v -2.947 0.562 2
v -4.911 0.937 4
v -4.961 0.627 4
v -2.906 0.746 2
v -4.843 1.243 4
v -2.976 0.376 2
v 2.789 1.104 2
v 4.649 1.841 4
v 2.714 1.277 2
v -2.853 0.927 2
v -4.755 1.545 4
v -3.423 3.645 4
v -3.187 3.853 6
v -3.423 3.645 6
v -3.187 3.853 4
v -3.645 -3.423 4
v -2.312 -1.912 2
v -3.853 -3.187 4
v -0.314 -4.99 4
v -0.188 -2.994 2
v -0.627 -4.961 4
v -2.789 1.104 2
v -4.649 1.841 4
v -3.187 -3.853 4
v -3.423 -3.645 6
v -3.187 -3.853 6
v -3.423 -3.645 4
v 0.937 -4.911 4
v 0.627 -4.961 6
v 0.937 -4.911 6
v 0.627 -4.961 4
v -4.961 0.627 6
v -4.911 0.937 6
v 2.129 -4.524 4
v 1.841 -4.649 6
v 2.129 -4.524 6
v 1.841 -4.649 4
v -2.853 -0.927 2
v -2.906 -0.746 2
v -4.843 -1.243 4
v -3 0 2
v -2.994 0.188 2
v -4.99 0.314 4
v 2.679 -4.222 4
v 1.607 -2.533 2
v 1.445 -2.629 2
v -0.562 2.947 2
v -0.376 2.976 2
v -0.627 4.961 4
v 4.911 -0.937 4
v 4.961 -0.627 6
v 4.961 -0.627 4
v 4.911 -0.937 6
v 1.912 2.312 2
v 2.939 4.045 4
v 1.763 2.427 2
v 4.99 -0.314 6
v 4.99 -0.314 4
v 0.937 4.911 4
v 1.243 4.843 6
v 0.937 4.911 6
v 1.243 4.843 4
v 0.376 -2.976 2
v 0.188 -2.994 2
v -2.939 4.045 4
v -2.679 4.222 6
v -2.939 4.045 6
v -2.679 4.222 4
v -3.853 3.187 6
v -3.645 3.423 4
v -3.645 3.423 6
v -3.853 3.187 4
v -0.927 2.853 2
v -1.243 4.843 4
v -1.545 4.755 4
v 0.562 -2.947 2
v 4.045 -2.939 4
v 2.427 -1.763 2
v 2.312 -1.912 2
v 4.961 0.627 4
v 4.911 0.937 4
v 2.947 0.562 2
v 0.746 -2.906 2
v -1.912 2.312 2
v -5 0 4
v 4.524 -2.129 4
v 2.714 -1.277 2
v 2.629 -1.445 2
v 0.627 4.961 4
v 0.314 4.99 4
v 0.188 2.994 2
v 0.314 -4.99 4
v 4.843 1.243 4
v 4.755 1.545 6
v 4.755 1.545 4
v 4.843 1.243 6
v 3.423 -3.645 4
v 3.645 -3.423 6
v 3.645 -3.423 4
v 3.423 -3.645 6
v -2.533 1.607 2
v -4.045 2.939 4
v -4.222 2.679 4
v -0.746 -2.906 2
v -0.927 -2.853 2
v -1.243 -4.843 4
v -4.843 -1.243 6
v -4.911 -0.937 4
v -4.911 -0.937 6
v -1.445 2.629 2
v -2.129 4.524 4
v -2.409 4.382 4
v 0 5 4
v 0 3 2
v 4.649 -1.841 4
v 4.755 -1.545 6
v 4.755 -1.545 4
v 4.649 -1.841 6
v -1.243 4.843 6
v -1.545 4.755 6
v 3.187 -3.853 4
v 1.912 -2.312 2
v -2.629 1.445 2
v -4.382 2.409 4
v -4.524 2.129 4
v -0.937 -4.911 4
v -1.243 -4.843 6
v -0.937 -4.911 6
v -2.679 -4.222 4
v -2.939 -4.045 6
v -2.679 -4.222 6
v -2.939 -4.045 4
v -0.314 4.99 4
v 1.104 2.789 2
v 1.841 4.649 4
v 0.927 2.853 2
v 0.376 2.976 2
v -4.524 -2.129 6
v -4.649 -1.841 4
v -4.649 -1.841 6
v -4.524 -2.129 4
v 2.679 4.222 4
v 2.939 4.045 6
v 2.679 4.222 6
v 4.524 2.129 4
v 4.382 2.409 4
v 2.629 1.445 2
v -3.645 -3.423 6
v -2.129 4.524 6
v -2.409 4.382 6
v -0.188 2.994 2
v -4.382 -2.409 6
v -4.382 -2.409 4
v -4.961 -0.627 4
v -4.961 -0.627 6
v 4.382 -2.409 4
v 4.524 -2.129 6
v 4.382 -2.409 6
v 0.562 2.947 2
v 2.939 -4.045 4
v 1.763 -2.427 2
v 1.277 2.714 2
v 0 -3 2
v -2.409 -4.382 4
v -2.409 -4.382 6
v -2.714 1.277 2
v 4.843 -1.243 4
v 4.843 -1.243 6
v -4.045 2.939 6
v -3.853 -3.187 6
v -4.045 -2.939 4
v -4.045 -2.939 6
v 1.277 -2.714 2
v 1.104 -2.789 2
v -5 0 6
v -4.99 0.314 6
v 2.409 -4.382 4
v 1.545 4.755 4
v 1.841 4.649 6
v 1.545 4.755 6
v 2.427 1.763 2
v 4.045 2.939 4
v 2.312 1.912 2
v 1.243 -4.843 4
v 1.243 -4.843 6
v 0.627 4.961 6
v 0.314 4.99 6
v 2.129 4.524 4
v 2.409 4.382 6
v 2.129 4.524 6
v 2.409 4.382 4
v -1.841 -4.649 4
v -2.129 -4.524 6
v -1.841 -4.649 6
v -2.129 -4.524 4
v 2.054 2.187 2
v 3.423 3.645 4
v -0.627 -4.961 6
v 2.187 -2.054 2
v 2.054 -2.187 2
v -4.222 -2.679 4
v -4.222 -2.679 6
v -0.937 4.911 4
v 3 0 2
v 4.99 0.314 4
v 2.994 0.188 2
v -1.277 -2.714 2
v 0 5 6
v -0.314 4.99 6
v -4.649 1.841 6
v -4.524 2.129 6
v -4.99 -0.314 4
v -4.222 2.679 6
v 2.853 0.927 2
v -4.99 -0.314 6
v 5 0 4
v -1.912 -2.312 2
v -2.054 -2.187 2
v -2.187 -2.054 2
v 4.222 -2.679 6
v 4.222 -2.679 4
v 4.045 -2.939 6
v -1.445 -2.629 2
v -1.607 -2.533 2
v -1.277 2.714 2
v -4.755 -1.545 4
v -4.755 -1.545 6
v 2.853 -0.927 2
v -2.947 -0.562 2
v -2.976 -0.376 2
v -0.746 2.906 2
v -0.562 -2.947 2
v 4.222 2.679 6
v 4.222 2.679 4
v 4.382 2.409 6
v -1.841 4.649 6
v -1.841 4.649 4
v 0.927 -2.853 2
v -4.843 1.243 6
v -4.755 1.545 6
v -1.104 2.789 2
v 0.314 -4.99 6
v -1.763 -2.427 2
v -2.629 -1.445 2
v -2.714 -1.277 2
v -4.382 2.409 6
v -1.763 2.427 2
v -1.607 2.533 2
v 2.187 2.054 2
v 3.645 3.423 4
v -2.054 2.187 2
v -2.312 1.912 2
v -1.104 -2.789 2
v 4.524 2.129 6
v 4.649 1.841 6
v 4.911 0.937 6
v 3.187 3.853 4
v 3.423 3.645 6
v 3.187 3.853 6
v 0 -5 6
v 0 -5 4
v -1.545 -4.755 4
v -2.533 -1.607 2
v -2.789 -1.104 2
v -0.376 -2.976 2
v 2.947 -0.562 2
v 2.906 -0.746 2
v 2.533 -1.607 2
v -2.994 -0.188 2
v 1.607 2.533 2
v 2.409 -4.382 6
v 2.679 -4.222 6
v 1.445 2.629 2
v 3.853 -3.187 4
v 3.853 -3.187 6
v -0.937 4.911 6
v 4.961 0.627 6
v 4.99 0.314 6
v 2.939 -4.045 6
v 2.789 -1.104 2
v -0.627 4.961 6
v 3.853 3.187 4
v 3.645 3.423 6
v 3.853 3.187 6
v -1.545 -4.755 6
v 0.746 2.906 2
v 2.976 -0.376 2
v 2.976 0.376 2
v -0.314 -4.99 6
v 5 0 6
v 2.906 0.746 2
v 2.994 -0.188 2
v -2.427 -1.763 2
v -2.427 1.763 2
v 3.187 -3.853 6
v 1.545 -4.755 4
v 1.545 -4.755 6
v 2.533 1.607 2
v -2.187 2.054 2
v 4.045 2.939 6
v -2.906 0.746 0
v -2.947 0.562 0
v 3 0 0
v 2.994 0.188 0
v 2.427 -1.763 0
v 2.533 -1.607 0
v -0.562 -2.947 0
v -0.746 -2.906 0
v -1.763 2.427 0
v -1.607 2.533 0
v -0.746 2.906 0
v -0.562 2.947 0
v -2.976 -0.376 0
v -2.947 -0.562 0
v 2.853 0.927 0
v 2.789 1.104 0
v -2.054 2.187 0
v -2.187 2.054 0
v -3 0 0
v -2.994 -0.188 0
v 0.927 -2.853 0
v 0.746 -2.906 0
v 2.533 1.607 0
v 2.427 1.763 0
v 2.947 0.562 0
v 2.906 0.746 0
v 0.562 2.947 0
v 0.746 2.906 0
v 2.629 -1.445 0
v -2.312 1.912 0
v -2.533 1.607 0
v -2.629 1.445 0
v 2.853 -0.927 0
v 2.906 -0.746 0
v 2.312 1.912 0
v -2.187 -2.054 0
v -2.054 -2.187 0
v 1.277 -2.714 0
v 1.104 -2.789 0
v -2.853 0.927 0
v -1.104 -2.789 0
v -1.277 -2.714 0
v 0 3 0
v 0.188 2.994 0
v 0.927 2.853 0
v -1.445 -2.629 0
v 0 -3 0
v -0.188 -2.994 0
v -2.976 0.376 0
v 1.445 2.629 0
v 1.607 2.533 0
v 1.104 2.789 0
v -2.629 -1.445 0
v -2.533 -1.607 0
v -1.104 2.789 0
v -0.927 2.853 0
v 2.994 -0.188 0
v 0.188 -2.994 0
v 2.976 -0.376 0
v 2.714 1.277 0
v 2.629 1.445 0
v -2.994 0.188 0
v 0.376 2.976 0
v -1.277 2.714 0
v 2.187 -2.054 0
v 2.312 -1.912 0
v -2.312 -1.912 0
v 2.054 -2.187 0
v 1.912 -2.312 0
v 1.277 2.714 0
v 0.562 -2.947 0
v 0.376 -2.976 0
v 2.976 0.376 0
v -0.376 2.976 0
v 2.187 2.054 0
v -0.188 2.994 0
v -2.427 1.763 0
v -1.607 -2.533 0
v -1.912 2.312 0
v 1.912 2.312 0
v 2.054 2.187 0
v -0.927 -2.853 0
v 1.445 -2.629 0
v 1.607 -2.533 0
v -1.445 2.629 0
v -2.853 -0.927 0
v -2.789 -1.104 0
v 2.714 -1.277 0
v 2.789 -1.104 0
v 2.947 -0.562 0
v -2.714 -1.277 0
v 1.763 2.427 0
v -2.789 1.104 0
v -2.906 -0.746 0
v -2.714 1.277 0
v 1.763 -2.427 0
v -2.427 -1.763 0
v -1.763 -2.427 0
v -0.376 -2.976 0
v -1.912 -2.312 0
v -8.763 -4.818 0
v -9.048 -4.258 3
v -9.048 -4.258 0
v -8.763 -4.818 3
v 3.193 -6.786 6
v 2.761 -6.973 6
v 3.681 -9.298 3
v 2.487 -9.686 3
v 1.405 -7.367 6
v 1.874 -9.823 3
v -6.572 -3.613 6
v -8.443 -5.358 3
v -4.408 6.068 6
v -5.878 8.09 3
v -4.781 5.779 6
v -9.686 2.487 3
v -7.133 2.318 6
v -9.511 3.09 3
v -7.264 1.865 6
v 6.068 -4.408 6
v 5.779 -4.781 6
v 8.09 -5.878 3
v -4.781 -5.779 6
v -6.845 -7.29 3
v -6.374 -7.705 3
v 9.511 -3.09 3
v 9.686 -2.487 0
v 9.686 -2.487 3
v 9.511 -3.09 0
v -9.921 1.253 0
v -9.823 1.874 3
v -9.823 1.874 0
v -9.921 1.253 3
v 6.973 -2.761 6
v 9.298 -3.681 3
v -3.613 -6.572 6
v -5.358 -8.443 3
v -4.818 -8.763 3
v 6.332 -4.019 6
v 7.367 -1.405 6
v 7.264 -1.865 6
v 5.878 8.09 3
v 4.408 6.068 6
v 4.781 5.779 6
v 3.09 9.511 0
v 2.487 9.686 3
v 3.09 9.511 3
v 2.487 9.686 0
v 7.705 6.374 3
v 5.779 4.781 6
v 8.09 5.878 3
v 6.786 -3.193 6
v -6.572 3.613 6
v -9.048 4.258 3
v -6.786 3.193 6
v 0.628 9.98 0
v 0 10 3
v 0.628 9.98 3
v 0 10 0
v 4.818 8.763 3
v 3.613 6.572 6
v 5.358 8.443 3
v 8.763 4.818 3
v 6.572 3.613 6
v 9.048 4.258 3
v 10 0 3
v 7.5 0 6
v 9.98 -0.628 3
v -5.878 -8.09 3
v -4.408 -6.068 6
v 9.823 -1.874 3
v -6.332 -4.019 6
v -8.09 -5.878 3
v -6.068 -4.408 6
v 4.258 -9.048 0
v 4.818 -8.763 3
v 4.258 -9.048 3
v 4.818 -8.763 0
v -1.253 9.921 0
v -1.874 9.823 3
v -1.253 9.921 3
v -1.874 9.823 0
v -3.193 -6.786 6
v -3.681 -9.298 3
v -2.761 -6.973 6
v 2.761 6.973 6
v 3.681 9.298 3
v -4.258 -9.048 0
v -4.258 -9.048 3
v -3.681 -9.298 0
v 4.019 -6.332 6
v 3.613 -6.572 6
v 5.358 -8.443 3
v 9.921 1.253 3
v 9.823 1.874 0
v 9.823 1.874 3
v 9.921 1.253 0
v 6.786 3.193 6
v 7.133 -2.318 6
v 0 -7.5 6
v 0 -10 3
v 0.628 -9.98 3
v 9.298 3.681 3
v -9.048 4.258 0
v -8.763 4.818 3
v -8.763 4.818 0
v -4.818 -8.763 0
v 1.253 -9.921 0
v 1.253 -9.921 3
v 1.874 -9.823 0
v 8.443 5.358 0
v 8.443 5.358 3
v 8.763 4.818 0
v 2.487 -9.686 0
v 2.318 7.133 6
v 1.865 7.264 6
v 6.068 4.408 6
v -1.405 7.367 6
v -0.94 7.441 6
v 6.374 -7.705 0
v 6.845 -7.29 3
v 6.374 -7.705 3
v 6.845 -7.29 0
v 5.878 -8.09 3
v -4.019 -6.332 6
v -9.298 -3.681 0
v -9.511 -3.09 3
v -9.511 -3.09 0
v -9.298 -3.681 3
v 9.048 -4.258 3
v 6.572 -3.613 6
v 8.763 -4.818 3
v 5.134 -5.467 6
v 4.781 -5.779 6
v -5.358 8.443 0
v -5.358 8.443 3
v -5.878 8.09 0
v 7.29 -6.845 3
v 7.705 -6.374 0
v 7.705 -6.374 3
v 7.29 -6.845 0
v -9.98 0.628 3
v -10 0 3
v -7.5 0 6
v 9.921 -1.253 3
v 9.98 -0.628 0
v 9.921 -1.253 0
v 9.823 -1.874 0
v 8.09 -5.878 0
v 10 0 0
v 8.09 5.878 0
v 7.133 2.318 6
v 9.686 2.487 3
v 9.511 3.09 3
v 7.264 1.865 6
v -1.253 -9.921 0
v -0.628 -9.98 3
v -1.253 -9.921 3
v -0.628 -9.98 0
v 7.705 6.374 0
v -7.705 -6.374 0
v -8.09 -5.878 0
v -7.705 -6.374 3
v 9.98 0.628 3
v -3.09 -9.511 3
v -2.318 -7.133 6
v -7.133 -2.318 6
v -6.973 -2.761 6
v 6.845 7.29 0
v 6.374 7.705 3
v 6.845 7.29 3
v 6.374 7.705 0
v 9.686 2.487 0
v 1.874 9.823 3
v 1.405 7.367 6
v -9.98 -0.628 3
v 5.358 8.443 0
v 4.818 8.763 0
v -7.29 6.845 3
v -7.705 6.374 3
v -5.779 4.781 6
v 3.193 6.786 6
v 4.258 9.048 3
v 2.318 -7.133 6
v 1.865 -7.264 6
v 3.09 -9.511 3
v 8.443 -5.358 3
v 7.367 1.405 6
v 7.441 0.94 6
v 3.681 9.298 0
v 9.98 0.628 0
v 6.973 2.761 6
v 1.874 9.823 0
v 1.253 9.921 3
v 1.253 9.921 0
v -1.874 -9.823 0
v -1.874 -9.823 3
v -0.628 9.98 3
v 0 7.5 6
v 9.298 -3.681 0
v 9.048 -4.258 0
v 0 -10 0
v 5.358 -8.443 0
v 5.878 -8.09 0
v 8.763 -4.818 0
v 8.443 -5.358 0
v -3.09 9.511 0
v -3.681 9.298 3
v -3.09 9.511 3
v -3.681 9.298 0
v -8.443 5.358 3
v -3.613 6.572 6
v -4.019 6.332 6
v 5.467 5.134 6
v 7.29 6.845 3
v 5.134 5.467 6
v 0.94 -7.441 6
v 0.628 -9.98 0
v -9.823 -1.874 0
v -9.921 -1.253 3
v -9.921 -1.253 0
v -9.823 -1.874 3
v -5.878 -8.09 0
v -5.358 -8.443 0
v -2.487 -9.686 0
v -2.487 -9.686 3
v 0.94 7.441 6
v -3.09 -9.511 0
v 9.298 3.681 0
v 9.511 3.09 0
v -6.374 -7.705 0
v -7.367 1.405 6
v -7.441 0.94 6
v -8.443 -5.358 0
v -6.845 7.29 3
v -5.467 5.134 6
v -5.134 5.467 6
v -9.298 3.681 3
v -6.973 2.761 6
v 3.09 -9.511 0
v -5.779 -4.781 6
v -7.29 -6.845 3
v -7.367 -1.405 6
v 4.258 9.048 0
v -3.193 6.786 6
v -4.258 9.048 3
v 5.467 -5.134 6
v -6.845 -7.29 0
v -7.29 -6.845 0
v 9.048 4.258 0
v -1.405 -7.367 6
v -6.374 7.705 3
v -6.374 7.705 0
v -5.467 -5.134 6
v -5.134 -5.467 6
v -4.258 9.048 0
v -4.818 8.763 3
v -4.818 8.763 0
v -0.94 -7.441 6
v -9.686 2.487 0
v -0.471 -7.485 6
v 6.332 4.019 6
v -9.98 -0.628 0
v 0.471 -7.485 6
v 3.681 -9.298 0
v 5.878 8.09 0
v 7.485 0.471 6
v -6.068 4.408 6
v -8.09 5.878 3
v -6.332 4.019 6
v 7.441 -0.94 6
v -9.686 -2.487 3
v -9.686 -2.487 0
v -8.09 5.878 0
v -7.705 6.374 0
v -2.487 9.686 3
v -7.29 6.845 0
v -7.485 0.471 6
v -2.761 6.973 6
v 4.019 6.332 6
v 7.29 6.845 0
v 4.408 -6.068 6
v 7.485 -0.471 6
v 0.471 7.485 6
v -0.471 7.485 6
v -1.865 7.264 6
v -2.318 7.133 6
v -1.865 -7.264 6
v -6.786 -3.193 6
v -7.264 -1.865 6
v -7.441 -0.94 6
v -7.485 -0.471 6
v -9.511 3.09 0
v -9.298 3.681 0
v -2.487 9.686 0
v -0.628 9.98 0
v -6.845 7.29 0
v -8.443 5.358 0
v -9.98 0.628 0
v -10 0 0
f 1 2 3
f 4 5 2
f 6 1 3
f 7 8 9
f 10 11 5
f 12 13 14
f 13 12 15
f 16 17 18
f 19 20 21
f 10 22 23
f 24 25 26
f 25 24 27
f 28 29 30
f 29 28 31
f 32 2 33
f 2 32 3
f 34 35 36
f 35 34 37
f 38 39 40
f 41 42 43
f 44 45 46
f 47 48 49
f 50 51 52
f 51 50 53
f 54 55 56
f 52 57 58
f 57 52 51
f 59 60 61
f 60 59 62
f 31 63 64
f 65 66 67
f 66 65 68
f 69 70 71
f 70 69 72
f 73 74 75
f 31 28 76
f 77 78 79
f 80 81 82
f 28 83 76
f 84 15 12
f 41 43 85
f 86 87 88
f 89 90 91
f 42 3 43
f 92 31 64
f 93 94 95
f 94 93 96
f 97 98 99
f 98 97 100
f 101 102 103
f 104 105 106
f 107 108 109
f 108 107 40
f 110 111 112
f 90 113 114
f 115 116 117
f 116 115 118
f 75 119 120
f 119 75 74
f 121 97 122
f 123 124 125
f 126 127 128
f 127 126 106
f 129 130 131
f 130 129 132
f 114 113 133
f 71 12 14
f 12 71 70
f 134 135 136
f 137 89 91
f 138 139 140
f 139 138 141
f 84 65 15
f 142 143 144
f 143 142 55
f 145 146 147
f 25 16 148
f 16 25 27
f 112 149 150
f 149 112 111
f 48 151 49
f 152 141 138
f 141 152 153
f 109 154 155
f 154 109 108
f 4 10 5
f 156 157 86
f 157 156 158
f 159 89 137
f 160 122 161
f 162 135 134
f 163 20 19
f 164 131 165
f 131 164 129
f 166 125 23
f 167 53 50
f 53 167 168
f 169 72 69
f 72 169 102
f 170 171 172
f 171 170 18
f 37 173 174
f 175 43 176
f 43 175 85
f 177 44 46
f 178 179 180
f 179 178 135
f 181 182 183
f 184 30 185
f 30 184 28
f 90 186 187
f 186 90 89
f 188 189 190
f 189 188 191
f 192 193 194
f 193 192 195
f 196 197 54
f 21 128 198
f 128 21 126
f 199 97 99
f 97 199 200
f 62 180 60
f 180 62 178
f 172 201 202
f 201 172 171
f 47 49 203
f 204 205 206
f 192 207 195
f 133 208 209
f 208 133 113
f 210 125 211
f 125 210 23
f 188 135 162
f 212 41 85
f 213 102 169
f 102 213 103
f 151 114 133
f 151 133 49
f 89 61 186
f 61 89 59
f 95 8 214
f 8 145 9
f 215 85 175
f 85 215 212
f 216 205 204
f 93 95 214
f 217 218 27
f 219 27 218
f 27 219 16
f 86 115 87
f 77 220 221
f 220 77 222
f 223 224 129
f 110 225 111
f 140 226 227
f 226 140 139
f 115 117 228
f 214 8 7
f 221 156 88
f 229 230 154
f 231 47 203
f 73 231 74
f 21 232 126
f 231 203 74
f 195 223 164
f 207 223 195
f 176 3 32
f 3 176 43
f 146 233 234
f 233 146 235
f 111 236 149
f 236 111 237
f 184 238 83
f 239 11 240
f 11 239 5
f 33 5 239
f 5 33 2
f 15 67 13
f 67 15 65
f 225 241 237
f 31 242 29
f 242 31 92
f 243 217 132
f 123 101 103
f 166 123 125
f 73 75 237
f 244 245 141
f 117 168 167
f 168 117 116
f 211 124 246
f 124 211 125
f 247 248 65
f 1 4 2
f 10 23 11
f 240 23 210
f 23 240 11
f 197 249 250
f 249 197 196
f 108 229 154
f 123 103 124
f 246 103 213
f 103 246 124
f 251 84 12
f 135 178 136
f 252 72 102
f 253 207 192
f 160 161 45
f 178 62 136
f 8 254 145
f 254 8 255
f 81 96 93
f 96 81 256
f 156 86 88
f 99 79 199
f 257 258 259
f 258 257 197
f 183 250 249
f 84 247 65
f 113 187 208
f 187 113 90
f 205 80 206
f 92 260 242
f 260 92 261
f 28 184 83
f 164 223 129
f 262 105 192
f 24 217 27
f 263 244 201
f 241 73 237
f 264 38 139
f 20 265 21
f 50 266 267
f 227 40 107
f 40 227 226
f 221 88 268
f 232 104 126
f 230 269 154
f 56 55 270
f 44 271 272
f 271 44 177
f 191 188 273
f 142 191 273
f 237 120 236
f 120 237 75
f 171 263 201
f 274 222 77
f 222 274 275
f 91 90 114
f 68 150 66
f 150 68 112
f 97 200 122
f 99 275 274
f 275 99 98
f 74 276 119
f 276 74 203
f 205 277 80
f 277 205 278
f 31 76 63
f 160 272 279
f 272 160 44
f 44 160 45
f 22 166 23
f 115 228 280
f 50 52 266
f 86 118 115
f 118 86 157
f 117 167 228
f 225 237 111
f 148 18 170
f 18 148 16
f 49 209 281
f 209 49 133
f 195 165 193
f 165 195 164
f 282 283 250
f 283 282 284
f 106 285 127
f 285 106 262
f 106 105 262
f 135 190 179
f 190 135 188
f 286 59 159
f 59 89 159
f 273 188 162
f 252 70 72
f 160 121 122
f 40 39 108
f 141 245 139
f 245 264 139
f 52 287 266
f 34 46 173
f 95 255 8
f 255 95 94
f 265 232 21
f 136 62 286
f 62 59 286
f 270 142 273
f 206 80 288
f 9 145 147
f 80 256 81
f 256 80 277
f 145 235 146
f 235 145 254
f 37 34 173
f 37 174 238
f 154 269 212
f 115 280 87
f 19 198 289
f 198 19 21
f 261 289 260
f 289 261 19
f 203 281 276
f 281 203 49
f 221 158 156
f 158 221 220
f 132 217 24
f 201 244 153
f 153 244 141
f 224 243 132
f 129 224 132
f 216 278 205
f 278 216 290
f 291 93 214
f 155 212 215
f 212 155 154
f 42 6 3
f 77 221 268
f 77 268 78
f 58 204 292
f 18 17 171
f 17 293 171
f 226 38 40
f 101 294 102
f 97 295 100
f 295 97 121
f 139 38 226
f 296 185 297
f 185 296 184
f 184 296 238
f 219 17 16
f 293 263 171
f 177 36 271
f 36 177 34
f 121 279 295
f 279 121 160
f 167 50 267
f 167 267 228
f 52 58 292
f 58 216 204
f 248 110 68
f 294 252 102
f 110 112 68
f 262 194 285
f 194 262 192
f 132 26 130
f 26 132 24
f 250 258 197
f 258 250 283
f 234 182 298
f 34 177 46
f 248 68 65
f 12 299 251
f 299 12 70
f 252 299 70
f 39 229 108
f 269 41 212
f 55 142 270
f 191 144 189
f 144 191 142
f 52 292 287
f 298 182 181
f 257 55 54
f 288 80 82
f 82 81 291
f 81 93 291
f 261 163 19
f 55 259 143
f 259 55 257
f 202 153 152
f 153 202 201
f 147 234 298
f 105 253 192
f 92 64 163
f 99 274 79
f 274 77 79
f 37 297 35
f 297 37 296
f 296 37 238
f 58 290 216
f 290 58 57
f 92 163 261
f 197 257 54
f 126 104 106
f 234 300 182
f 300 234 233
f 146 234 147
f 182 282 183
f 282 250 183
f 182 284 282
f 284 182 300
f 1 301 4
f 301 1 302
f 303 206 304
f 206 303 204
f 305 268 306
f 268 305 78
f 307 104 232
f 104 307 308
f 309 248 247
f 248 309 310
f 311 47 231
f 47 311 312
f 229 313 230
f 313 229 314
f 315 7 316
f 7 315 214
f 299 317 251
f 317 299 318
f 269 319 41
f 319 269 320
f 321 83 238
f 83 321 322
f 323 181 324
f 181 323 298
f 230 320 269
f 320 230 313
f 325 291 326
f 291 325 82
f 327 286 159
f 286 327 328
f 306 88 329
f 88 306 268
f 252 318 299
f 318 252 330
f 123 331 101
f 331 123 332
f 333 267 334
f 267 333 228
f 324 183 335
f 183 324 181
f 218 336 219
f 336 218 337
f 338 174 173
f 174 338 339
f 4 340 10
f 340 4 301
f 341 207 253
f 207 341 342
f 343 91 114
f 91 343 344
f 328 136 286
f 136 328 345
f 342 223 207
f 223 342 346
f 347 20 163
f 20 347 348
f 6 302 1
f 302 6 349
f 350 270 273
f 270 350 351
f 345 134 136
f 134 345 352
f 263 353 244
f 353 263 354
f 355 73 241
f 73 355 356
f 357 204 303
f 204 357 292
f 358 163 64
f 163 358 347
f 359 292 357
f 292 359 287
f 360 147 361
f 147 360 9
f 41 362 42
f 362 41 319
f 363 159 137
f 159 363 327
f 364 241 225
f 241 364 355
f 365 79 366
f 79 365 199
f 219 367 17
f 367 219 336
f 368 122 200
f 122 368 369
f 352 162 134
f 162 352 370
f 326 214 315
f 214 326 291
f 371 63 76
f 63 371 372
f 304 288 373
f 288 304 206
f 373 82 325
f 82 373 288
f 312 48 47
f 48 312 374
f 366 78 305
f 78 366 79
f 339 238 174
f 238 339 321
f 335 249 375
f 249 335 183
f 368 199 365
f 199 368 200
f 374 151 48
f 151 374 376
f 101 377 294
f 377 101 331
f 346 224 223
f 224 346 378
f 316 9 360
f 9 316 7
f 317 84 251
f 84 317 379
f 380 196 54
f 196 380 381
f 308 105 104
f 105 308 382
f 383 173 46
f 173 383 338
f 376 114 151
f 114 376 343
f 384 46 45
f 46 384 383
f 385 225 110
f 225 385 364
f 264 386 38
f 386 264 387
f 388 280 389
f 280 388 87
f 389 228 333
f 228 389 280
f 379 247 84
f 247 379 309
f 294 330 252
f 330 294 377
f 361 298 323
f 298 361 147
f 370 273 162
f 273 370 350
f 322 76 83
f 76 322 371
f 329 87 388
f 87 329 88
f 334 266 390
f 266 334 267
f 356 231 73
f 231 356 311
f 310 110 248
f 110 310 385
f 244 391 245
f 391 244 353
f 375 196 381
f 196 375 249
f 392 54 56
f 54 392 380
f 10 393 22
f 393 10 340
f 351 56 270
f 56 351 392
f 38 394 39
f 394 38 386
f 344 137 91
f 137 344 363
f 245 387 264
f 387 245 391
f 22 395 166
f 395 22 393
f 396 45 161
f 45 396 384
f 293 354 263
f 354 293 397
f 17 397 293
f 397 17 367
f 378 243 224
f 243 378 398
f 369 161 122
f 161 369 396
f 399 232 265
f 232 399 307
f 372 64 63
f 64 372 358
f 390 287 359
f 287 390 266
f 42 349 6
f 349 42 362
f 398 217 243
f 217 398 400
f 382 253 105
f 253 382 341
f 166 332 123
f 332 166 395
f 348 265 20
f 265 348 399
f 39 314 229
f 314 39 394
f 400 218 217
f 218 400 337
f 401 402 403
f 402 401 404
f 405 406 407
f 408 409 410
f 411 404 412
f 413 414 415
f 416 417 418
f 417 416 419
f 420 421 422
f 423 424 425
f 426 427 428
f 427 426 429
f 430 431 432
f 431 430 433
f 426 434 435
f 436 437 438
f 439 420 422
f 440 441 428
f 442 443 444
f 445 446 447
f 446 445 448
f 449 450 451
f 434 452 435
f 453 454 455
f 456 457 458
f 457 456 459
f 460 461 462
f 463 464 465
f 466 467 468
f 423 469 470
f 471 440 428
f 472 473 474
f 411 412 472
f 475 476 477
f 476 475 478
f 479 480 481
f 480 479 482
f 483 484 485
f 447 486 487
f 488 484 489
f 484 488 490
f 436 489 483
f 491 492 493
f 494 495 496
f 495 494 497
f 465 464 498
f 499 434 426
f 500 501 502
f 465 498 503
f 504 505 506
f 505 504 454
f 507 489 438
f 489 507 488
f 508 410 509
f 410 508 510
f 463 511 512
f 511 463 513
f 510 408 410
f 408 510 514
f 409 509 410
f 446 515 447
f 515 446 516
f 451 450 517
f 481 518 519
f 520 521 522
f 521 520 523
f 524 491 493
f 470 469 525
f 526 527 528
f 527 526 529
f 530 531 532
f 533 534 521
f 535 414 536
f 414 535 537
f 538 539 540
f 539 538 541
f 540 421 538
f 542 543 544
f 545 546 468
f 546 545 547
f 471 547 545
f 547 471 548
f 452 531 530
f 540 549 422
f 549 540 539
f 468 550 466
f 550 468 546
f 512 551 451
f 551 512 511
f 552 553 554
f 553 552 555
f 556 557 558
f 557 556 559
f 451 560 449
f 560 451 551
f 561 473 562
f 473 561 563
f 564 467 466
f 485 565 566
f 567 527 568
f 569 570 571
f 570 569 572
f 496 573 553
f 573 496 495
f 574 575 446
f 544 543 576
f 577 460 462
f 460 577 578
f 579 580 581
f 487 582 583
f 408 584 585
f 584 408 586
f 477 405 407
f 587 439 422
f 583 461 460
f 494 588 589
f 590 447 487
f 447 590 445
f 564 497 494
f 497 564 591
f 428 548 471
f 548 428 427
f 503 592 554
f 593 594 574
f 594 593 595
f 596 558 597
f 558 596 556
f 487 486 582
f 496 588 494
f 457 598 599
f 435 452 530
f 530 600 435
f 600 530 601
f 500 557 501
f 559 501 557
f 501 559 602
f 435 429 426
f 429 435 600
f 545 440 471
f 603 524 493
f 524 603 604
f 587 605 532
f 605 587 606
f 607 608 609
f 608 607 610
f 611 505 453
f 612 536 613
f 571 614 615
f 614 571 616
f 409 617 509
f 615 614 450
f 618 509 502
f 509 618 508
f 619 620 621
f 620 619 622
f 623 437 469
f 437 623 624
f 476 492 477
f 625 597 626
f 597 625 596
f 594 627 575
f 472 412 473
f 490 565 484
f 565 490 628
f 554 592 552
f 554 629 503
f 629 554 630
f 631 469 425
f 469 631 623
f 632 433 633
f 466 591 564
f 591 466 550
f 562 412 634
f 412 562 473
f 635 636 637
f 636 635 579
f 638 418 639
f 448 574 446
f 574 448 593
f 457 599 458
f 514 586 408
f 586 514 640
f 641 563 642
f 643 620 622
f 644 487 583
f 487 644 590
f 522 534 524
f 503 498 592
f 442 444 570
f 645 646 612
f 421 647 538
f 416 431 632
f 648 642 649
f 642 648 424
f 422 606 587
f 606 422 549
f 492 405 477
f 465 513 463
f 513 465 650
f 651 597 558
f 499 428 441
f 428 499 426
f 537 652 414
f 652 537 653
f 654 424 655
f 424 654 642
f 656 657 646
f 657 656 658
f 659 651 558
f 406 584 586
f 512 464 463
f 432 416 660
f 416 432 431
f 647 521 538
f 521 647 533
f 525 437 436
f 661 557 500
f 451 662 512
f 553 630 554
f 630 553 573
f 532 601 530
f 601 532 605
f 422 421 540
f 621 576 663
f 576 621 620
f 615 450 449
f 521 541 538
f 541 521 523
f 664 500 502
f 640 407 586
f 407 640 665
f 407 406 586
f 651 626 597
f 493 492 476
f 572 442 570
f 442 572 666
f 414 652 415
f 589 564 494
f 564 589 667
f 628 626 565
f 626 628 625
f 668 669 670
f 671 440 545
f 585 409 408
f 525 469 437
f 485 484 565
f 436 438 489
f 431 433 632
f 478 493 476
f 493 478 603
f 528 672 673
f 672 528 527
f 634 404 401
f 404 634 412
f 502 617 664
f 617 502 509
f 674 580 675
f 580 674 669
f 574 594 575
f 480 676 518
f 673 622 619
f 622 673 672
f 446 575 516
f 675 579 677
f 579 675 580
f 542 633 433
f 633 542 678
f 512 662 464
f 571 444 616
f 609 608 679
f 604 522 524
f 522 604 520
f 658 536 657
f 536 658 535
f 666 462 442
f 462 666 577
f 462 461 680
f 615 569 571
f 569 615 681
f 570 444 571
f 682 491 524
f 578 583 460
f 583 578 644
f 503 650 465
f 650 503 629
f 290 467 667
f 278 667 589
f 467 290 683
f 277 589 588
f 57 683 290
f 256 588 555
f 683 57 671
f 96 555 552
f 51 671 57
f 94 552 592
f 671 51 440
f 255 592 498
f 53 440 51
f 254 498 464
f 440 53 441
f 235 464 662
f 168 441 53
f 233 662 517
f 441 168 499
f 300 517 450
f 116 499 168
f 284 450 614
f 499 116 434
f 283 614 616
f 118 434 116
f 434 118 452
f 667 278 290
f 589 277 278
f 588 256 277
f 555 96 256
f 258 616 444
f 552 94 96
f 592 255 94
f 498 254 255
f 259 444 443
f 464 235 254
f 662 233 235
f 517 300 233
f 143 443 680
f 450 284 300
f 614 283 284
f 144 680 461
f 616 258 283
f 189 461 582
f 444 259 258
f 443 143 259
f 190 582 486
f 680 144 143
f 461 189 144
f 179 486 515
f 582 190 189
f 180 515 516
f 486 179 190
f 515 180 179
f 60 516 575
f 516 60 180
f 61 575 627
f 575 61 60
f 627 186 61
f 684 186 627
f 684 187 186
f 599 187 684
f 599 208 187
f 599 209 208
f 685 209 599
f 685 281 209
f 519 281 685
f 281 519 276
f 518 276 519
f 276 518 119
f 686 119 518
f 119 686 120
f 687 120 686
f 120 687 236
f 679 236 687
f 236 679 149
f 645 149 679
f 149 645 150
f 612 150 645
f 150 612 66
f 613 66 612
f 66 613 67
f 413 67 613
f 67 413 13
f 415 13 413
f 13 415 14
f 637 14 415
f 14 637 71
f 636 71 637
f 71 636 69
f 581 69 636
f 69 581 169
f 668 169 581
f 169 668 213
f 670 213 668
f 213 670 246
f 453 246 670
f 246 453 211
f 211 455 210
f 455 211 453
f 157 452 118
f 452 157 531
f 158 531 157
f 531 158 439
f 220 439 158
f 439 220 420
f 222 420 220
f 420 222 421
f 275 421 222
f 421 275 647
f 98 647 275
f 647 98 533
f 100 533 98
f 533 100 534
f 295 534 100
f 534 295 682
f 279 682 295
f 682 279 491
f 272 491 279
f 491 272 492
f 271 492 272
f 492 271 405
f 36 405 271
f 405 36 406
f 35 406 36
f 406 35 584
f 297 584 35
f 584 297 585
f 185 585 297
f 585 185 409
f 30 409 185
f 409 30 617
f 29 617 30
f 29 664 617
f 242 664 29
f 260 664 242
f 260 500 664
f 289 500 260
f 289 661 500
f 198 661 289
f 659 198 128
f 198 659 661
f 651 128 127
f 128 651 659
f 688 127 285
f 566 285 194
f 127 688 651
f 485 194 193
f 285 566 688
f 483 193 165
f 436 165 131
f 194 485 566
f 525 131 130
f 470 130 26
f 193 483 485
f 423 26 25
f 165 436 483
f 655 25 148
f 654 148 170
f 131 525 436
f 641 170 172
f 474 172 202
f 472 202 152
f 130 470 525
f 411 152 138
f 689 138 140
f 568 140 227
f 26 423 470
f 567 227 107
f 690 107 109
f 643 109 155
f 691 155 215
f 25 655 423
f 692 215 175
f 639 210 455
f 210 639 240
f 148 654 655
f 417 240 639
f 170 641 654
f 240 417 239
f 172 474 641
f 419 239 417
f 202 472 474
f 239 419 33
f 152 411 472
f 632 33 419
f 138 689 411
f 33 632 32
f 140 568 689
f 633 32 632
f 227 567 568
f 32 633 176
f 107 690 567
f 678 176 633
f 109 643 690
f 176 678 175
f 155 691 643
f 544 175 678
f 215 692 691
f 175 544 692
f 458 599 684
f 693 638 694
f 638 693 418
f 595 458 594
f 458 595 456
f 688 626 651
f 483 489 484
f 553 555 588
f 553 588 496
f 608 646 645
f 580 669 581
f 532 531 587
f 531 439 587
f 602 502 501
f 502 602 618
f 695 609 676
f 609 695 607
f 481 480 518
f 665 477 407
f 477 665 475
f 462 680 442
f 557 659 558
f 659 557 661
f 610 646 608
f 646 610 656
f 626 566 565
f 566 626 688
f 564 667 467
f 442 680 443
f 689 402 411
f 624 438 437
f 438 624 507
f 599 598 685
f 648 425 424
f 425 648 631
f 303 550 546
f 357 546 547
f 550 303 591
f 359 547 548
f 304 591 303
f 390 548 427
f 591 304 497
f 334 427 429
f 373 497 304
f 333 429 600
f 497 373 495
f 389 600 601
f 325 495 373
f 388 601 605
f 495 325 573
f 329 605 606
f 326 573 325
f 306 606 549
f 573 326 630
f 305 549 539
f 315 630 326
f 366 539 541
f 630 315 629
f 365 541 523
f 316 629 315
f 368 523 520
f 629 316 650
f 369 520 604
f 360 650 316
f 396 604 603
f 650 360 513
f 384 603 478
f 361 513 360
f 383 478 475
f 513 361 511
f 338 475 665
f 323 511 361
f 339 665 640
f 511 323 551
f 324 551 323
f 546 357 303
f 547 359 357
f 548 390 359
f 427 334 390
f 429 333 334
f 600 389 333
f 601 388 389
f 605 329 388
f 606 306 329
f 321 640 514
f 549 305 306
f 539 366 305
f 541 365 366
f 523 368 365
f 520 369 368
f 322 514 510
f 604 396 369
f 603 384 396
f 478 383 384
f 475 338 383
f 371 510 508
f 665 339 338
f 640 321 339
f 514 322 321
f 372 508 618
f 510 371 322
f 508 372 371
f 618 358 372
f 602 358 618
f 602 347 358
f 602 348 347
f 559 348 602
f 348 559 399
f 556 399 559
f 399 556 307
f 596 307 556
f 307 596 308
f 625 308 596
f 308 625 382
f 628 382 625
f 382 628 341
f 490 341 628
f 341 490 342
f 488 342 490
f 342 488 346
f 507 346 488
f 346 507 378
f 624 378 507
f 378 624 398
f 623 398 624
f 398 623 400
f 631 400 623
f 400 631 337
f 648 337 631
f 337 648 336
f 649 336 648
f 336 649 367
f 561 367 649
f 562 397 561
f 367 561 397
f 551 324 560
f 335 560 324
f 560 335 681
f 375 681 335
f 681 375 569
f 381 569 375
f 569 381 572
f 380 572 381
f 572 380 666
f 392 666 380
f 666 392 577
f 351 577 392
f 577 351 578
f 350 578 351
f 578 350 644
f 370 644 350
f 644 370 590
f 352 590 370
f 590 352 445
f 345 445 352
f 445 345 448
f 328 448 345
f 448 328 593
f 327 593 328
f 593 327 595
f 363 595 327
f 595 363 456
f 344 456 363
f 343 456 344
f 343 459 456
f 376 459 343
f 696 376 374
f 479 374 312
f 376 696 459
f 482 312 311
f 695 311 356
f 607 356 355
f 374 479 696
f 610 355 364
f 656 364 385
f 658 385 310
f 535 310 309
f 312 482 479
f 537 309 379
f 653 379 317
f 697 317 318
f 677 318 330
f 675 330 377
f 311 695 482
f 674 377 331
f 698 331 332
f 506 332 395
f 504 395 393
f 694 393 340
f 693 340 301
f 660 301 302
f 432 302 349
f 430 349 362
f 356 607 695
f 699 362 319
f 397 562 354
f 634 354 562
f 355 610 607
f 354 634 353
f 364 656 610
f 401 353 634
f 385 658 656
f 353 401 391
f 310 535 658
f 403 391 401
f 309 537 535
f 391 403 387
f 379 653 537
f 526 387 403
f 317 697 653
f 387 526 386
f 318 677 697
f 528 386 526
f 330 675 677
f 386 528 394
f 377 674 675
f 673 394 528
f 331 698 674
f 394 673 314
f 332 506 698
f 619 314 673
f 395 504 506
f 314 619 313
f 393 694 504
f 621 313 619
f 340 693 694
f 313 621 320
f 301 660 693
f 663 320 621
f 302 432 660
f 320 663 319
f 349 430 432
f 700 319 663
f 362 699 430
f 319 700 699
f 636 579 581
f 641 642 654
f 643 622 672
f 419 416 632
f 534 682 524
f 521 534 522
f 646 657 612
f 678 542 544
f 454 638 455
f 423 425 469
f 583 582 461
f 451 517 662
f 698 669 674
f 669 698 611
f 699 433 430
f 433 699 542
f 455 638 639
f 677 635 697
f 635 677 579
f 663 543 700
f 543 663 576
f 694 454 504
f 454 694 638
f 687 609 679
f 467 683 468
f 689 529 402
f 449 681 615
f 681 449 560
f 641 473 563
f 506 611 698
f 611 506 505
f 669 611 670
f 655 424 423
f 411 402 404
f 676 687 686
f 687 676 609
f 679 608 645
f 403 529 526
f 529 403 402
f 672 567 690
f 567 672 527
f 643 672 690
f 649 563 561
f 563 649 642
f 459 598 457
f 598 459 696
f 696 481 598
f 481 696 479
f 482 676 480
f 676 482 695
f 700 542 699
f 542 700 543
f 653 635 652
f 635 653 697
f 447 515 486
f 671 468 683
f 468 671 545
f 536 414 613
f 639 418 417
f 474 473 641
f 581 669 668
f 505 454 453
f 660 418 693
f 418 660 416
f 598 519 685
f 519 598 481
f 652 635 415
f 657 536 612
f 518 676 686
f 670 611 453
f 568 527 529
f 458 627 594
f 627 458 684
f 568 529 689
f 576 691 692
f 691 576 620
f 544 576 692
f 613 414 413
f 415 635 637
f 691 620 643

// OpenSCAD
$fn=100;

difference(){
  hull(){
    cylinder(r=7.5,h=6);
    cylinder(r=10,h=3);
    }
  union(){
    hull(){
      translate([0,0,4])
        cylinder(r=5,h=8);
      translate([0,0,2])
      cylinder(r=3,h=12);
      }
    translate([0,0,-1])
      cylinder(r=3,h=12);
    }
  }
